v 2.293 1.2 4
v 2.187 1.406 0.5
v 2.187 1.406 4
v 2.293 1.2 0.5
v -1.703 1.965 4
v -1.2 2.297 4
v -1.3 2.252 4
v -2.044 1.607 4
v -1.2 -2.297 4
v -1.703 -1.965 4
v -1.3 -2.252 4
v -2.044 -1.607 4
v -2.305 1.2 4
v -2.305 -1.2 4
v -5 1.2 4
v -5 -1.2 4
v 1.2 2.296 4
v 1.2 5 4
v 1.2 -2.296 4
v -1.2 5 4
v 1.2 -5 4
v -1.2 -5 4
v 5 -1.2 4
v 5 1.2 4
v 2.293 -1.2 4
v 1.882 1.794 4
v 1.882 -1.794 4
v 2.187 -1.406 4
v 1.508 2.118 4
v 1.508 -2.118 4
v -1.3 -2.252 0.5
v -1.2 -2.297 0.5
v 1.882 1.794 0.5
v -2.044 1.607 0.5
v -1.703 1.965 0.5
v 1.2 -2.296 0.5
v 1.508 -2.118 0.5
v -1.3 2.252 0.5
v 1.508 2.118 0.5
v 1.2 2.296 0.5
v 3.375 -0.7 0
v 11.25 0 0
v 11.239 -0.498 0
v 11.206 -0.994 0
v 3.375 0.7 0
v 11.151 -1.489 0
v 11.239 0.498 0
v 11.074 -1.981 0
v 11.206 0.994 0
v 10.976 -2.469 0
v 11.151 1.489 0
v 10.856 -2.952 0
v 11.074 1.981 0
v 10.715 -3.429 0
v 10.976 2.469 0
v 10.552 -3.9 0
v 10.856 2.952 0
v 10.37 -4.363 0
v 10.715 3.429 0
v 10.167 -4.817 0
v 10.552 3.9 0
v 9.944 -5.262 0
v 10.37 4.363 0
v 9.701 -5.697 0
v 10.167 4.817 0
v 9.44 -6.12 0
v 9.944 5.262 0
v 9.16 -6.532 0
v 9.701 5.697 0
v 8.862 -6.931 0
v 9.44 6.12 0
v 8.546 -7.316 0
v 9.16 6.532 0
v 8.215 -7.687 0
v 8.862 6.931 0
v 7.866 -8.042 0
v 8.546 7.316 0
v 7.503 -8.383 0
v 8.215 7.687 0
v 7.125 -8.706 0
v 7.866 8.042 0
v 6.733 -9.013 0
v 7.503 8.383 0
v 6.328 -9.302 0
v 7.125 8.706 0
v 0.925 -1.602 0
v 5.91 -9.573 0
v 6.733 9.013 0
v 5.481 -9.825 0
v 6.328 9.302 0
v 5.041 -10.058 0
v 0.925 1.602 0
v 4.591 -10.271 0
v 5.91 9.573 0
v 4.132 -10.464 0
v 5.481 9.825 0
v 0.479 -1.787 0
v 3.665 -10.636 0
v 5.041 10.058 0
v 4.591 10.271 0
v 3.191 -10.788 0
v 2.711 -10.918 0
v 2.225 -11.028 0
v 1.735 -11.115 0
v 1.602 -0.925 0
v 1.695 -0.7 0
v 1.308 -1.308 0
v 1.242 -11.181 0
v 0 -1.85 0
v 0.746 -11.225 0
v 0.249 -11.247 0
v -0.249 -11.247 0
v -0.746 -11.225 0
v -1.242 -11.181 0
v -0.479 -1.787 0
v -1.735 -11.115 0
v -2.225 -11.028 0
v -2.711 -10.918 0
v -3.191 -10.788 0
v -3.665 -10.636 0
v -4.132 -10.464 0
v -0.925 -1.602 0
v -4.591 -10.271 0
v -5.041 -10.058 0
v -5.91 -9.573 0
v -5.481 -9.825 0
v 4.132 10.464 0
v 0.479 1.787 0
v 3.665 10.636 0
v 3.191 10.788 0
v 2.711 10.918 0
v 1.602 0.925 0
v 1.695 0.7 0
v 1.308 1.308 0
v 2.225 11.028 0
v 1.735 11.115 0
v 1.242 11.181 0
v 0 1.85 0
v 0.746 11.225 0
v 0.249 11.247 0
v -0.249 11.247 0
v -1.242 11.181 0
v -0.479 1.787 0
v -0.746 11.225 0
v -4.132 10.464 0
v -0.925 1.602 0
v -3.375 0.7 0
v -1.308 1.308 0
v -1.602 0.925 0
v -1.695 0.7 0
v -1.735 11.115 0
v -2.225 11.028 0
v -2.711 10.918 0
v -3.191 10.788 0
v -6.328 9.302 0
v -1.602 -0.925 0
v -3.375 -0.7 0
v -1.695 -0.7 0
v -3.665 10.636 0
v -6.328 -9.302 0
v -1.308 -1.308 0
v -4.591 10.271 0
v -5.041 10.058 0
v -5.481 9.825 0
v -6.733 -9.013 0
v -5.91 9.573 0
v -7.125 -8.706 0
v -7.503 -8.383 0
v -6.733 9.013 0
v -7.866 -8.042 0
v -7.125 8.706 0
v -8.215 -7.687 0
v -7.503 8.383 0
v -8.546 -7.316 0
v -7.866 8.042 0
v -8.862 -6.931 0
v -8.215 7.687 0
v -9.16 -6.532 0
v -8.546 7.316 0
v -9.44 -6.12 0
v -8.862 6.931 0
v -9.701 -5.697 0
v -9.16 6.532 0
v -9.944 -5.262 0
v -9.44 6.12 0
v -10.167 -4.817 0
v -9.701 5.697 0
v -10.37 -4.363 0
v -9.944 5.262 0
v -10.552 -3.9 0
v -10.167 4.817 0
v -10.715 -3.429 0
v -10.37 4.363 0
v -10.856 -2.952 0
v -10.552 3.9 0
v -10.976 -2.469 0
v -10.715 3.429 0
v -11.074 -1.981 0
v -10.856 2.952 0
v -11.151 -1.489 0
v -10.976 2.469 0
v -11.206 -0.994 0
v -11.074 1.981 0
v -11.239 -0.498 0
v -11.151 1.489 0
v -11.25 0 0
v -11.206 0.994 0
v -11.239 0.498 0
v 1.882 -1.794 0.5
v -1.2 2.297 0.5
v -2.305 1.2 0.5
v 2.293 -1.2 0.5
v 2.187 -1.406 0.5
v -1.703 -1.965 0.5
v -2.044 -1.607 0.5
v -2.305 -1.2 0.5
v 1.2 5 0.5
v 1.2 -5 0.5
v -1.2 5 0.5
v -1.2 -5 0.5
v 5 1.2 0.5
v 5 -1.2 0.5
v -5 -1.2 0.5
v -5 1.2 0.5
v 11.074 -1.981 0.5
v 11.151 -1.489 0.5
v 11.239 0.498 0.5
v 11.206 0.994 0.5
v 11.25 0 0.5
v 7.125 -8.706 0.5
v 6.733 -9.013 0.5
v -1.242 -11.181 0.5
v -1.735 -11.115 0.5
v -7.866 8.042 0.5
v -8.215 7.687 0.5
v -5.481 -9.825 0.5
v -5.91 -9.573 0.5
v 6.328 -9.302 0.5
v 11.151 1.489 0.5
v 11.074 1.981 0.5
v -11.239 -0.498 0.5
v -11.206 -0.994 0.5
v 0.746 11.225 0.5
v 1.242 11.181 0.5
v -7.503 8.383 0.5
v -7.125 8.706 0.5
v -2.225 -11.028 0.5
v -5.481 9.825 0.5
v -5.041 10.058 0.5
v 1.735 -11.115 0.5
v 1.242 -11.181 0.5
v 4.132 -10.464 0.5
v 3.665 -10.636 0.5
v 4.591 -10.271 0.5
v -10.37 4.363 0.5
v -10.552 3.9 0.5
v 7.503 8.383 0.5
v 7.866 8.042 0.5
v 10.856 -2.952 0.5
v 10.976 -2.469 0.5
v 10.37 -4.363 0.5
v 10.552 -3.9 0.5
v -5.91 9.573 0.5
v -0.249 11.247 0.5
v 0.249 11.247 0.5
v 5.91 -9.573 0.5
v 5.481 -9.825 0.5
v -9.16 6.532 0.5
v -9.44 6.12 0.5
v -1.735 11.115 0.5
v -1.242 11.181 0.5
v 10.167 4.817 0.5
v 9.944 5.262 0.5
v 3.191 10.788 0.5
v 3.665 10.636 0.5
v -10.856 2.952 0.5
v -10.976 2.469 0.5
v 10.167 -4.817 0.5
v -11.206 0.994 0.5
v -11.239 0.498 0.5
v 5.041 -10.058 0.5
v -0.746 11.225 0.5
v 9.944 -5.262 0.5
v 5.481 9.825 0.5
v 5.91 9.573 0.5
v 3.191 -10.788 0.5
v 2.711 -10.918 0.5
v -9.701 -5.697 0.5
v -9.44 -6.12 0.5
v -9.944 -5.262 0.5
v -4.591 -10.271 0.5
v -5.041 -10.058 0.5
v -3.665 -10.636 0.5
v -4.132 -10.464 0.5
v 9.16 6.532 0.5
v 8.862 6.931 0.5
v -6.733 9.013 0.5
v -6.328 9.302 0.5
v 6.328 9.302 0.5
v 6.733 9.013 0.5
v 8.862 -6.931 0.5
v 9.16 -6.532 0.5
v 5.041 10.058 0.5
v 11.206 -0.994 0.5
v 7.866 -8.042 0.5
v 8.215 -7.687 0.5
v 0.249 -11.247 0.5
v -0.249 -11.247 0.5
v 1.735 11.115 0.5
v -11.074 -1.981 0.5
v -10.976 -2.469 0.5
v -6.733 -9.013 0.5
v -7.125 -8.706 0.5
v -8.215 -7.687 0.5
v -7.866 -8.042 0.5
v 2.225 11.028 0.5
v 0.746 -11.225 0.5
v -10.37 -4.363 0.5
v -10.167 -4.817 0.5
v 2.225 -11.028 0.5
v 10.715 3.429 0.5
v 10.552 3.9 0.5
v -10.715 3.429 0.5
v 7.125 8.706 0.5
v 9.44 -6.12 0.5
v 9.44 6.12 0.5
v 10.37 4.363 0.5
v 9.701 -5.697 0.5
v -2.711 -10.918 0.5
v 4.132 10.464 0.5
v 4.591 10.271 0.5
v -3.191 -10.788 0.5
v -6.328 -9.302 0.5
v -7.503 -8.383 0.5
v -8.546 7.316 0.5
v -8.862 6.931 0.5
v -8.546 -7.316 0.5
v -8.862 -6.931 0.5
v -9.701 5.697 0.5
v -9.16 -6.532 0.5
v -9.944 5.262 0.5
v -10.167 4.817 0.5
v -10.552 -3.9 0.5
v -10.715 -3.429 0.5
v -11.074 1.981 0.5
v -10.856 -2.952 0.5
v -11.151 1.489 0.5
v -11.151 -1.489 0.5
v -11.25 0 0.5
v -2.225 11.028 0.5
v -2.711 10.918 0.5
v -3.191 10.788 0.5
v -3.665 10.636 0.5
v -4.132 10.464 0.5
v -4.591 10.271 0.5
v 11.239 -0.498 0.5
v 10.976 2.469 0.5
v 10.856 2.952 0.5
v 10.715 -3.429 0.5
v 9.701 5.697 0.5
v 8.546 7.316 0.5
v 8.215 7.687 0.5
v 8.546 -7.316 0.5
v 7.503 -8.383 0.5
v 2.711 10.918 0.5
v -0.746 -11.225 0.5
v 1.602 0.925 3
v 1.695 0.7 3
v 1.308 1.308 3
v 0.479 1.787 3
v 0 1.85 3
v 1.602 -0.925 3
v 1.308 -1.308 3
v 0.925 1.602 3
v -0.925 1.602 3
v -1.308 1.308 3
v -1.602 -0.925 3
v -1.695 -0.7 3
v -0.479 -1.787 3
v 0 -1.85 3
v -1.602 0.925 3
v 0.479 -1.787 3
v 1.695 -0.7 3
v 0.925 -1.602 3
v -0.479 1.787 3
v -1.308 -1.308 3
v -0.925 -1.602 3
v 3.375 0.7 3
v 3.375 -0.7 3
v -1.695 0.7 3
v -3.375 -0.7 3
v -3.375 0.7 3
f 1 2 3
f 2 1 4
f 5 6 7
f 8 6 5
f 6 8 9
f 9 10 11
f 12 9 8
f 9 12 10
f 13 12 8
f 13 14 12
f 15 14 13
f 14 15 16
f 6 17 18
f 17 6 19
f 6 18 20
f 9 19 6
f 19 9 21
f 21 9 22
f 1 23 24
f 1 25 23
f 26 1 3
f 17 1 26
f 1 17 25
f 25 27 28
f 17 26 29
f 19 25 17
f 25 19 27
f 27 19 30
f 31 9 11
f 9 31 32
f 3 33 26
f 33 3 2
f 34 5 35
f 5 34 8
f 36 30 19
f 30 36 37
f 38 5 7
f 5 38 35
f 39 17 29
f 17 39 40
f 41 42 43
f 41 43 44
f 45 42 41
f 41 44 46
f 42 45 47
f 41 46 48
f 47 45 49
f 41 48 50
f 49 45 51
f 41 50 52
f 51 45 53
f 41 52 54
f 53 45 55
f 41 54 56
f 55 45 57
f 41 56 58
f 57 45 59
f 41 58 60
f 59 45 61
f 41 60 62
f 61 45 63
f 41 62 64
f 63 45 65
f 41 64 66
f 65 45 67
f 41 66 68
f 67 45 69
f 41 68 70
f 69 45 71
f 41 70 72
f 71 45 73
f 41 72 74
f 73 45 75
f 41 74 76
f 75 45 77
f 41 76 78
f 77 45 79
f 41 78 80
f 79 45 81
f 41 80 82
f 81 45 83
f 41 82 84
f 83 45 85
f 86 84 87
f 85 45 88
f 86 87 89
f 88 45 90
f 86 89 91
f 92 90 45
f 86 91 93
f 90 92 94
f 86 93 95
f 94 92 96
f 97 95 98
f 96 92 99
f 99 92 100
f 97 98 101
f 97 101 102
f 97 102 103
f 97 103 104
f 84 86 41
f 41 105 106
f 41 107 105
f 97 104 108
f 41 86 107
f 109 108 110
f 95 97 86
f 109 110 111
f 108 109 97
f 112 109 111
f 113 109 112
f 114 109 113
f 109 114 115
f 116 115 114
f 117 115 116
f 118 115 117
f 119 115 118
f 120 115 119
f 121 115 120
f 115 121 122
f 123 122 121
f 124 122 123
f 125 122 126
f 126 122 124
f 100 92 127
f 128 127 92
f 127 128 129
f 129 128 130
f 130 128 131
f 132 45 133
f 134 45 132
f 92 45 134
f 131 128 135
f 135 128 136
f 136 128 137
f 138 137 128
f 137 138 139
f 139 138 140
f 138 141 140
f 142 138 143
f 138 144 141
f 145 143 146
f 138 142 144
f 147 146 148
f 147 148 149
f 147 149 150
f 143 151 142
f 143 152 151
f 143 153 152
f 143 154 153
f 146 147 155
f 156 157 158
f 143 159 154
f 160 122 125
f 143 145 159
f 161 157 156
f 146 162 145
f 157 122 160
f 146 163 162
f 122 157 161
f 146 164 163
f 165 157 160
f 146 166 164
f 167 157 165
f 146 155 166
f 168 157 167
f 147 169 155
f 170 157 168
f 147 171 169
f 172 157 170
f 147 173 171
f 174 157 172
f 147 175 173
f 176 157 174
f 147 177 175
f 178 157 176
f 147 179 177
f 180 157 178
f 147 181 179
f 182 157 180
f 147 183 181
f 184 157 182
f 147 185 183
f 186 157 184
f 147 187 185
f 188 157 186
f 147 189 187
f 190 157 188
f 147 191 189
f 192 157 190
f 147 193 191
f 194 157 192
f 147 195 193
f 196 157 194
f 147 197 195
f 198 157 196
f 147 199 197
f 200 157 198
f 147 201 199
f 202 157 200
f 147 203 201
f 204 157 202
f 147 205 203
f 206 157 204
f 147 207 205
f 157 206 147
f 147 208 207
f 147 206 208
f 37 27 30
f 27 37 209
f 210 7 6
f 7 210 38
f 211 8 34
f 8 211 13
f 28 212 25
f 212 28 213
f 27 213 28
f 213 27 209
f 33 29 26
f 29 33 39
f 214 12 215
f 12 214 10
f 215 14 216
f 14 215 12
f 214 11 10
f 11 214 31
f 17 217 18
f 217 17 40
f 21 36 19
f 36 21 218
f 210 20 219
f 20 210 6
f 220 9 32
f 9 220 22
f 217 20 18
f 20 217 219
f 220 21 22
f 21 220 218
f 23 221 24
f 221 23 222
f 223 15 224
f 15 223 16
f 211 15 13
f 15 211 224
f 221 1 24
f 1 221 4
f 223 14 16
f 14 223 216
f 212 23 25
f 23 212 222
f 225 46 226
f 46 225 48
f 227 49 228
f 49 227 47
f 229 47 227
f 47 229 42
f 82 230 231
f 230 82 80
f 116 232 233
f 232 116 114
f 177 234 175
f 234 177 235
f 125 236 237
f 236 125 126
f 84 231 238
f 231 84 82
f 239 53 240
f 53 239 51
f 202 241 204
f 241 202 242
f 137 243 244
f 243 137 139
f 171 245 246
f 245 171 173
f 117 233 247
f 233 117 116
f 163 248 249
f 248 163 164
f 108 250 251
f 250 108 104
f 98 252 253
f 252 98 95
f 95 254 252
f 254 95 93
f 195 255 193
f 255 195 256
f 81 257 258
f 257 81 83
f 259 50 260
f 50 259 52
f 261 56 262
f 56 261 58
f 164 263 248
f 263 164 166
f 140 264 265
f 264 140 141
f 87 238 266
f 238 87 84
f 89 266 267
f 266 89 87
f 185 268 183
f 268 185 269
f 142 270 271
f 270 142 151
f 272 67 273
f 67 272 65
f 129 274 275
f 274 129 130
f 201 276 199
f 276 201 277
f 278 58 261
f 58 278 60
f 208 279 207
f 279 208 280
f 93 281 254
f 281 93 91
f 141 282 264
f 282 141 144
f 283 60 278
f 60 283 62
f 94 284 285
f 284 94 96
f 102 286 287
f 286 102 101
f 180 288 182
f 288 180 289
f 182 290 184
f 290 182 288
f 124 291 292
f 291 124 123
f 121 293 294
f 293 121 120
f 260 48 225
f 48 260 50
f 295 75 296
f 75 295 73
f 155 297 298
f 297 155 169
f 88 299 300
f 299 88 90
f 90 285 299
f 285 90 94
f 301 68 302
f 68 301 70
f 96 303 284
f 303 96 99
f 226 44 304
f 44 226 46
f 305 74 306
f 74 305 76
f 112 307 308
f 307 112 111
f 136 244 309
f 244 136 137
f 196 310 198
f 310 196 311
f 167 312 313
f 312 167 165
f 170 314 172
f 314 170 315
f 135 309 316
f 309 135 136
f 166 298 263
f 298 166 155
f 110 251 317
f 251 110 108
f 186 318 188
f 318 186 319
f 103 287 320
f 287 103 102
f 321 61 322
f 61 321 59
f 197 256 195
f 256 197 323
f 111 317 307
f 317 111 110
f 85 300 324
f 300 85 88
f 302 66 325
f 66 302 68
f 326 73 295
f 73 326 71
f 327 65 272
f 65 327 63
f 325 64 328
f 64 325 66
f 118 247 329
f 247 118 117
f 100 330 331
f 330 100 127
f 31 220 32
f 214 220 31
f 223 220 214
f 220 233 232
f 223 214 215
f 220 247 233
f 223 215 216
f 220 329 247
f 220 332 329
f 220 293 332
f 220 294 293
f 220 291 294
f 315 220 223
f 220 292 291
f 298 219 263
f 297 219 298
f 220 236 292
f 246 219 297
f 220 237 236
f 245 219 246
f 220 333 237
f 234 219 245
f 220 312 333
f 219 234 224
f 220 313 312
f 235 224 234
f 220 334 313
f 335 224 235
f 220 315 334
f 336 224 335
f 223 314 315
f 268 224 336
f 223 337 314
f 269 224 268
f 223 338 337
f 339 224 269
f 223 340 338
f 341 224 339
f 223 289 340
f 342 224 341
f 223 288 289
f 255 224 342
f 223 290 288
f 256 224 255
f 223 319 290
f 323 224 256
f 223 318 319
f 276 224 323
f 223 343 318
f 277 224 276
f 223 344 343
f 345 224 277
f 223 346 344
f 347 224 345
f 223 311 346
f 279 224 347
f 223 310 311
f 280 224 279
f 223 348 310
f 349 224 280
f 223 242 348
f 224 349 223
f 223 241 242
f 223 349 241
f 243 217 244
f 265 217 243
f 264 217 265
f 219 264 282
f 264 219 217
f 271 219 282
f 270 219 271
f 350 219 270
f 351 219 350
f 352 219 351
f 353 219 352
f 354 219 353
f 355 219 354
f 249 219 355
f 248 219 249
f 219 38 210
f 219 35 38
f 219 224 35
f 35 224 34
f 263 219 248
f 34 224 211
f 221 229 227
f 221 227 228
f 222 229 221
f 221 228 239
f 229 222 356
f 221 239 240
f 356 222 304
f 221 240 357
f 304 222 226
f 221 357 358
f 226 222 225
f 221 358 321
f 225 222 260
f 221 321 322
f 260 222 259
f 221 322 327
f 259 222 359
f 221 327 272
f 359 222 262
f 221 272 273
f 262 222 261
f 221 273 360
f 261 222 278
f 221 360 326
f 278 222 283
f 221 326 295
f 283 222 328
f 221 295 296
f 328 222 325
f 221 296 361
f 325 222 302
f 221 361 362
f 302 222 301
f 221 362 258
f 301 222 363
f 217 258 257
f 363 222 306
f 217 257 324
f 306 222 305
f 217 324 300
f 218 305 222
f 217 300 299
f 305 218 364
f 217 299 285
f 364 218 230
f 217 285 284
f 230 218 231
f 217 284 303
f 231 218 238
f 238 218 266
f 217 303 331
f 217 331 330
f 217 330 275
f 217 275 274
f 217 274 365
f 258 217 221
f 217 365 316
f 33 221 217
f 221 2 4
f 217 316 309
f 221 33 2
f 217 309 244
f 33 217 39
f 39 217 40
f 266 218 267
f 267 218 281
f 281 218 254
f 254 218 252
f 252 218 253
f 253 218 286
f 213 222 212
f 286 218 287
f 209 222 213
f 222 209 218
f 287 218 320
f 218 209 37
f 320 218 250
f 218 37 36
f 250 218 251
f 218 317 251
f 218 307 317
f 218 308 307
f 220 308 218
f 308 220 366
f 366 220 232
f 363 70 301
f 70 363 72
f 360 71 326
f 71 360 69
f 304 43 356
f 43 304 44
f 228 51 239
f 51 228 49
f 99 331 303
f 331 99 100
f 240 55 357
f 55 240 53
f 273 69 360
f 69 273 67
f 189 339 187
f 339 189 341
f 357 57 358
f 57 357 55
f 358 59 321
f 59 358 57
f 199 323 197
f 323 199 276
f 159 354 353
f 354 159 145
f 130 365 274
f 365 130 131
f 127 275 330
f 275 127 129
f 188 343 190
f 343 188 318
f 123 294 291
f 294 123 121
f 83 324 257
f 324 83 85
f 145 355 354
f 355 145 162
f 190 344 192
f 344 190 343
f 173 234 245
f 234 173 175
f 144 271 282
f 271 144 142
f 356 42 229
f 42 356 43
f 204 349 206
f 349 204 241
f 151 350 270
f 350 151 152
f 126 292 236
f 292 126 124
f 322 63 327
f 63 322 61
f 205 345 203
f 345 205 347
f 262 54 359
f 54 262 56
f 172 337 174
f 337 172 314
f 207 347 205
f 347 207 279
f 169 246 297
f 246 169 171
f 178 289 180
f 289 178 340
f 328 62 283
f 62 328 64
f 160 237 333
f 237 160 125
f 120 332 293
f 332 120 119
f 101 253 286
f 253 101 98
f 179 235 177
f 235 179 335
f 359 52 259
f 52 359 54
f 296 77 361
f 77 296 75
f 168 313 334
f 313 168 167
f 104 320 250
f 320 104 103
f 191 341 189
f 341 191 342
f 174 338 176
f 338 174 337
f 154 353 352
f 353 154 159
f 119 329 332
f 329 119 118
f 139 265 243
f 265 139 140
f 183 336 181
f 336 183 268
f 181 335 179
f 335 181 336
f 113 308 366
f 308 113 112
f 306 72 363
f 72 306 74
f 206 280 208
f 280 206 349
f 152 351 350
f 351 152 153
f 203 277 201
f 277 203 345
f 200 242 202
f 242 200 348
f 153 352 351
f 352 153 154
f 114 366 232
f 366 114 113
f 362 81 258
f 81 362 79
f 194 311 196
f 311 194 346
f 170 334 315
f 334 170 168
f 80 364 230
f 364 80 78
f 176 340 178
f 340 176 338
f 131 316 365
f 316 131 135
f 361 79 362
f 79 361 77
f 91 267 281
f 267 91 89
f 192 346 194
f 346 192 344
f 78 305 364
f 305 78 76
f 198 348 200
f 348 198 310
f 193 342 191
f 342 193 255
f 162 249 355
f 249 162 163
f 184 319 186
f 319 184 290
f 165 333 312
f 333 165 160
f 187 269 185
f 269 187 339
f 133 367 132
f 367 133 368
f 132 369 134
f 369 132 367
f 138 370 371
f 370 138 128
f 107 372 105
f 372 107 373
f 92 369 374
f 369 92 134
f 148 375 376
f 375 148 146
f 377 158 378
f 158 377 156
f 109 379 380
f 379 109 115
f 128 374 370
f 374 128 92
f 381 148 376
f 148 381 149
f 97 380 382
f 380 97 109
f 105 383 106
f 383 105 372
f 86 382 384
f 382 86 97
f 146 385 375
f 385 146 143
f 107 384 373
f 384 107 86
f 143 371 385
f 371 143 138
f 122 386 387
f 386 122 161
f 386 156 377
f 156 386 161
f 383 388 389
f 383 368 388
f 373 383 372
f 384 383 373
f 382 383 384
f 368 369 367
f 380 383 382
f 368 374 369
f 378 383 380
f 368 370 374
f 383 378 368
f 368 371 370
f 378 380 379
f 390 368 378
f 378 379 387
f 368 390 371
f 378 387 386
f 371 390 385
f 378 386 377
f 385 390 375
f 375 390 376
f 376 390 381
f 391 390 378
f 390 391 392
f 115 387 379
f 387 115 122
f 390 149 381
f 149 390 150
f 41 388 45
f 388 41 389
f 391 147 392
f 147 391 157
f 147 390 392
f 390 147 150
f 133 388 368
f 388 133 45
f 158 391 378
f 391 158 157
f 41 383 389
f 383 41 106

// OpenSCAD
od1=22.5/2 ; //baseouter diamter
h1=0.5; //base height
// 120 cross
l120 = 10;
w120 = 2.4;
h120 = 4;
d120= 5.2/2;
// 620 cross
x620=6.75;
y620=1.4;
d620 = 3.7/2;
h620=3;

difference(){
        union() {
            cylinder (h1, od1, od1 , false,$fa=1, $fs=0.5);   
        translate([0,0,h120/2]) {
            cylinder (h120, d120, d120 , true,$fa=1, $fs=0.5);
            cube([w120,l120,h120],center=true);
            cube([l120,w120,h120],center=true);
                }
                }
  union(){
    cylinder (h620,d620,d620, false,$fa=1, $fs=0.5);
    translate ( [-x620/2 , -y620/2 ,0]) cube([x620,y620,h620]);
      }
  }
